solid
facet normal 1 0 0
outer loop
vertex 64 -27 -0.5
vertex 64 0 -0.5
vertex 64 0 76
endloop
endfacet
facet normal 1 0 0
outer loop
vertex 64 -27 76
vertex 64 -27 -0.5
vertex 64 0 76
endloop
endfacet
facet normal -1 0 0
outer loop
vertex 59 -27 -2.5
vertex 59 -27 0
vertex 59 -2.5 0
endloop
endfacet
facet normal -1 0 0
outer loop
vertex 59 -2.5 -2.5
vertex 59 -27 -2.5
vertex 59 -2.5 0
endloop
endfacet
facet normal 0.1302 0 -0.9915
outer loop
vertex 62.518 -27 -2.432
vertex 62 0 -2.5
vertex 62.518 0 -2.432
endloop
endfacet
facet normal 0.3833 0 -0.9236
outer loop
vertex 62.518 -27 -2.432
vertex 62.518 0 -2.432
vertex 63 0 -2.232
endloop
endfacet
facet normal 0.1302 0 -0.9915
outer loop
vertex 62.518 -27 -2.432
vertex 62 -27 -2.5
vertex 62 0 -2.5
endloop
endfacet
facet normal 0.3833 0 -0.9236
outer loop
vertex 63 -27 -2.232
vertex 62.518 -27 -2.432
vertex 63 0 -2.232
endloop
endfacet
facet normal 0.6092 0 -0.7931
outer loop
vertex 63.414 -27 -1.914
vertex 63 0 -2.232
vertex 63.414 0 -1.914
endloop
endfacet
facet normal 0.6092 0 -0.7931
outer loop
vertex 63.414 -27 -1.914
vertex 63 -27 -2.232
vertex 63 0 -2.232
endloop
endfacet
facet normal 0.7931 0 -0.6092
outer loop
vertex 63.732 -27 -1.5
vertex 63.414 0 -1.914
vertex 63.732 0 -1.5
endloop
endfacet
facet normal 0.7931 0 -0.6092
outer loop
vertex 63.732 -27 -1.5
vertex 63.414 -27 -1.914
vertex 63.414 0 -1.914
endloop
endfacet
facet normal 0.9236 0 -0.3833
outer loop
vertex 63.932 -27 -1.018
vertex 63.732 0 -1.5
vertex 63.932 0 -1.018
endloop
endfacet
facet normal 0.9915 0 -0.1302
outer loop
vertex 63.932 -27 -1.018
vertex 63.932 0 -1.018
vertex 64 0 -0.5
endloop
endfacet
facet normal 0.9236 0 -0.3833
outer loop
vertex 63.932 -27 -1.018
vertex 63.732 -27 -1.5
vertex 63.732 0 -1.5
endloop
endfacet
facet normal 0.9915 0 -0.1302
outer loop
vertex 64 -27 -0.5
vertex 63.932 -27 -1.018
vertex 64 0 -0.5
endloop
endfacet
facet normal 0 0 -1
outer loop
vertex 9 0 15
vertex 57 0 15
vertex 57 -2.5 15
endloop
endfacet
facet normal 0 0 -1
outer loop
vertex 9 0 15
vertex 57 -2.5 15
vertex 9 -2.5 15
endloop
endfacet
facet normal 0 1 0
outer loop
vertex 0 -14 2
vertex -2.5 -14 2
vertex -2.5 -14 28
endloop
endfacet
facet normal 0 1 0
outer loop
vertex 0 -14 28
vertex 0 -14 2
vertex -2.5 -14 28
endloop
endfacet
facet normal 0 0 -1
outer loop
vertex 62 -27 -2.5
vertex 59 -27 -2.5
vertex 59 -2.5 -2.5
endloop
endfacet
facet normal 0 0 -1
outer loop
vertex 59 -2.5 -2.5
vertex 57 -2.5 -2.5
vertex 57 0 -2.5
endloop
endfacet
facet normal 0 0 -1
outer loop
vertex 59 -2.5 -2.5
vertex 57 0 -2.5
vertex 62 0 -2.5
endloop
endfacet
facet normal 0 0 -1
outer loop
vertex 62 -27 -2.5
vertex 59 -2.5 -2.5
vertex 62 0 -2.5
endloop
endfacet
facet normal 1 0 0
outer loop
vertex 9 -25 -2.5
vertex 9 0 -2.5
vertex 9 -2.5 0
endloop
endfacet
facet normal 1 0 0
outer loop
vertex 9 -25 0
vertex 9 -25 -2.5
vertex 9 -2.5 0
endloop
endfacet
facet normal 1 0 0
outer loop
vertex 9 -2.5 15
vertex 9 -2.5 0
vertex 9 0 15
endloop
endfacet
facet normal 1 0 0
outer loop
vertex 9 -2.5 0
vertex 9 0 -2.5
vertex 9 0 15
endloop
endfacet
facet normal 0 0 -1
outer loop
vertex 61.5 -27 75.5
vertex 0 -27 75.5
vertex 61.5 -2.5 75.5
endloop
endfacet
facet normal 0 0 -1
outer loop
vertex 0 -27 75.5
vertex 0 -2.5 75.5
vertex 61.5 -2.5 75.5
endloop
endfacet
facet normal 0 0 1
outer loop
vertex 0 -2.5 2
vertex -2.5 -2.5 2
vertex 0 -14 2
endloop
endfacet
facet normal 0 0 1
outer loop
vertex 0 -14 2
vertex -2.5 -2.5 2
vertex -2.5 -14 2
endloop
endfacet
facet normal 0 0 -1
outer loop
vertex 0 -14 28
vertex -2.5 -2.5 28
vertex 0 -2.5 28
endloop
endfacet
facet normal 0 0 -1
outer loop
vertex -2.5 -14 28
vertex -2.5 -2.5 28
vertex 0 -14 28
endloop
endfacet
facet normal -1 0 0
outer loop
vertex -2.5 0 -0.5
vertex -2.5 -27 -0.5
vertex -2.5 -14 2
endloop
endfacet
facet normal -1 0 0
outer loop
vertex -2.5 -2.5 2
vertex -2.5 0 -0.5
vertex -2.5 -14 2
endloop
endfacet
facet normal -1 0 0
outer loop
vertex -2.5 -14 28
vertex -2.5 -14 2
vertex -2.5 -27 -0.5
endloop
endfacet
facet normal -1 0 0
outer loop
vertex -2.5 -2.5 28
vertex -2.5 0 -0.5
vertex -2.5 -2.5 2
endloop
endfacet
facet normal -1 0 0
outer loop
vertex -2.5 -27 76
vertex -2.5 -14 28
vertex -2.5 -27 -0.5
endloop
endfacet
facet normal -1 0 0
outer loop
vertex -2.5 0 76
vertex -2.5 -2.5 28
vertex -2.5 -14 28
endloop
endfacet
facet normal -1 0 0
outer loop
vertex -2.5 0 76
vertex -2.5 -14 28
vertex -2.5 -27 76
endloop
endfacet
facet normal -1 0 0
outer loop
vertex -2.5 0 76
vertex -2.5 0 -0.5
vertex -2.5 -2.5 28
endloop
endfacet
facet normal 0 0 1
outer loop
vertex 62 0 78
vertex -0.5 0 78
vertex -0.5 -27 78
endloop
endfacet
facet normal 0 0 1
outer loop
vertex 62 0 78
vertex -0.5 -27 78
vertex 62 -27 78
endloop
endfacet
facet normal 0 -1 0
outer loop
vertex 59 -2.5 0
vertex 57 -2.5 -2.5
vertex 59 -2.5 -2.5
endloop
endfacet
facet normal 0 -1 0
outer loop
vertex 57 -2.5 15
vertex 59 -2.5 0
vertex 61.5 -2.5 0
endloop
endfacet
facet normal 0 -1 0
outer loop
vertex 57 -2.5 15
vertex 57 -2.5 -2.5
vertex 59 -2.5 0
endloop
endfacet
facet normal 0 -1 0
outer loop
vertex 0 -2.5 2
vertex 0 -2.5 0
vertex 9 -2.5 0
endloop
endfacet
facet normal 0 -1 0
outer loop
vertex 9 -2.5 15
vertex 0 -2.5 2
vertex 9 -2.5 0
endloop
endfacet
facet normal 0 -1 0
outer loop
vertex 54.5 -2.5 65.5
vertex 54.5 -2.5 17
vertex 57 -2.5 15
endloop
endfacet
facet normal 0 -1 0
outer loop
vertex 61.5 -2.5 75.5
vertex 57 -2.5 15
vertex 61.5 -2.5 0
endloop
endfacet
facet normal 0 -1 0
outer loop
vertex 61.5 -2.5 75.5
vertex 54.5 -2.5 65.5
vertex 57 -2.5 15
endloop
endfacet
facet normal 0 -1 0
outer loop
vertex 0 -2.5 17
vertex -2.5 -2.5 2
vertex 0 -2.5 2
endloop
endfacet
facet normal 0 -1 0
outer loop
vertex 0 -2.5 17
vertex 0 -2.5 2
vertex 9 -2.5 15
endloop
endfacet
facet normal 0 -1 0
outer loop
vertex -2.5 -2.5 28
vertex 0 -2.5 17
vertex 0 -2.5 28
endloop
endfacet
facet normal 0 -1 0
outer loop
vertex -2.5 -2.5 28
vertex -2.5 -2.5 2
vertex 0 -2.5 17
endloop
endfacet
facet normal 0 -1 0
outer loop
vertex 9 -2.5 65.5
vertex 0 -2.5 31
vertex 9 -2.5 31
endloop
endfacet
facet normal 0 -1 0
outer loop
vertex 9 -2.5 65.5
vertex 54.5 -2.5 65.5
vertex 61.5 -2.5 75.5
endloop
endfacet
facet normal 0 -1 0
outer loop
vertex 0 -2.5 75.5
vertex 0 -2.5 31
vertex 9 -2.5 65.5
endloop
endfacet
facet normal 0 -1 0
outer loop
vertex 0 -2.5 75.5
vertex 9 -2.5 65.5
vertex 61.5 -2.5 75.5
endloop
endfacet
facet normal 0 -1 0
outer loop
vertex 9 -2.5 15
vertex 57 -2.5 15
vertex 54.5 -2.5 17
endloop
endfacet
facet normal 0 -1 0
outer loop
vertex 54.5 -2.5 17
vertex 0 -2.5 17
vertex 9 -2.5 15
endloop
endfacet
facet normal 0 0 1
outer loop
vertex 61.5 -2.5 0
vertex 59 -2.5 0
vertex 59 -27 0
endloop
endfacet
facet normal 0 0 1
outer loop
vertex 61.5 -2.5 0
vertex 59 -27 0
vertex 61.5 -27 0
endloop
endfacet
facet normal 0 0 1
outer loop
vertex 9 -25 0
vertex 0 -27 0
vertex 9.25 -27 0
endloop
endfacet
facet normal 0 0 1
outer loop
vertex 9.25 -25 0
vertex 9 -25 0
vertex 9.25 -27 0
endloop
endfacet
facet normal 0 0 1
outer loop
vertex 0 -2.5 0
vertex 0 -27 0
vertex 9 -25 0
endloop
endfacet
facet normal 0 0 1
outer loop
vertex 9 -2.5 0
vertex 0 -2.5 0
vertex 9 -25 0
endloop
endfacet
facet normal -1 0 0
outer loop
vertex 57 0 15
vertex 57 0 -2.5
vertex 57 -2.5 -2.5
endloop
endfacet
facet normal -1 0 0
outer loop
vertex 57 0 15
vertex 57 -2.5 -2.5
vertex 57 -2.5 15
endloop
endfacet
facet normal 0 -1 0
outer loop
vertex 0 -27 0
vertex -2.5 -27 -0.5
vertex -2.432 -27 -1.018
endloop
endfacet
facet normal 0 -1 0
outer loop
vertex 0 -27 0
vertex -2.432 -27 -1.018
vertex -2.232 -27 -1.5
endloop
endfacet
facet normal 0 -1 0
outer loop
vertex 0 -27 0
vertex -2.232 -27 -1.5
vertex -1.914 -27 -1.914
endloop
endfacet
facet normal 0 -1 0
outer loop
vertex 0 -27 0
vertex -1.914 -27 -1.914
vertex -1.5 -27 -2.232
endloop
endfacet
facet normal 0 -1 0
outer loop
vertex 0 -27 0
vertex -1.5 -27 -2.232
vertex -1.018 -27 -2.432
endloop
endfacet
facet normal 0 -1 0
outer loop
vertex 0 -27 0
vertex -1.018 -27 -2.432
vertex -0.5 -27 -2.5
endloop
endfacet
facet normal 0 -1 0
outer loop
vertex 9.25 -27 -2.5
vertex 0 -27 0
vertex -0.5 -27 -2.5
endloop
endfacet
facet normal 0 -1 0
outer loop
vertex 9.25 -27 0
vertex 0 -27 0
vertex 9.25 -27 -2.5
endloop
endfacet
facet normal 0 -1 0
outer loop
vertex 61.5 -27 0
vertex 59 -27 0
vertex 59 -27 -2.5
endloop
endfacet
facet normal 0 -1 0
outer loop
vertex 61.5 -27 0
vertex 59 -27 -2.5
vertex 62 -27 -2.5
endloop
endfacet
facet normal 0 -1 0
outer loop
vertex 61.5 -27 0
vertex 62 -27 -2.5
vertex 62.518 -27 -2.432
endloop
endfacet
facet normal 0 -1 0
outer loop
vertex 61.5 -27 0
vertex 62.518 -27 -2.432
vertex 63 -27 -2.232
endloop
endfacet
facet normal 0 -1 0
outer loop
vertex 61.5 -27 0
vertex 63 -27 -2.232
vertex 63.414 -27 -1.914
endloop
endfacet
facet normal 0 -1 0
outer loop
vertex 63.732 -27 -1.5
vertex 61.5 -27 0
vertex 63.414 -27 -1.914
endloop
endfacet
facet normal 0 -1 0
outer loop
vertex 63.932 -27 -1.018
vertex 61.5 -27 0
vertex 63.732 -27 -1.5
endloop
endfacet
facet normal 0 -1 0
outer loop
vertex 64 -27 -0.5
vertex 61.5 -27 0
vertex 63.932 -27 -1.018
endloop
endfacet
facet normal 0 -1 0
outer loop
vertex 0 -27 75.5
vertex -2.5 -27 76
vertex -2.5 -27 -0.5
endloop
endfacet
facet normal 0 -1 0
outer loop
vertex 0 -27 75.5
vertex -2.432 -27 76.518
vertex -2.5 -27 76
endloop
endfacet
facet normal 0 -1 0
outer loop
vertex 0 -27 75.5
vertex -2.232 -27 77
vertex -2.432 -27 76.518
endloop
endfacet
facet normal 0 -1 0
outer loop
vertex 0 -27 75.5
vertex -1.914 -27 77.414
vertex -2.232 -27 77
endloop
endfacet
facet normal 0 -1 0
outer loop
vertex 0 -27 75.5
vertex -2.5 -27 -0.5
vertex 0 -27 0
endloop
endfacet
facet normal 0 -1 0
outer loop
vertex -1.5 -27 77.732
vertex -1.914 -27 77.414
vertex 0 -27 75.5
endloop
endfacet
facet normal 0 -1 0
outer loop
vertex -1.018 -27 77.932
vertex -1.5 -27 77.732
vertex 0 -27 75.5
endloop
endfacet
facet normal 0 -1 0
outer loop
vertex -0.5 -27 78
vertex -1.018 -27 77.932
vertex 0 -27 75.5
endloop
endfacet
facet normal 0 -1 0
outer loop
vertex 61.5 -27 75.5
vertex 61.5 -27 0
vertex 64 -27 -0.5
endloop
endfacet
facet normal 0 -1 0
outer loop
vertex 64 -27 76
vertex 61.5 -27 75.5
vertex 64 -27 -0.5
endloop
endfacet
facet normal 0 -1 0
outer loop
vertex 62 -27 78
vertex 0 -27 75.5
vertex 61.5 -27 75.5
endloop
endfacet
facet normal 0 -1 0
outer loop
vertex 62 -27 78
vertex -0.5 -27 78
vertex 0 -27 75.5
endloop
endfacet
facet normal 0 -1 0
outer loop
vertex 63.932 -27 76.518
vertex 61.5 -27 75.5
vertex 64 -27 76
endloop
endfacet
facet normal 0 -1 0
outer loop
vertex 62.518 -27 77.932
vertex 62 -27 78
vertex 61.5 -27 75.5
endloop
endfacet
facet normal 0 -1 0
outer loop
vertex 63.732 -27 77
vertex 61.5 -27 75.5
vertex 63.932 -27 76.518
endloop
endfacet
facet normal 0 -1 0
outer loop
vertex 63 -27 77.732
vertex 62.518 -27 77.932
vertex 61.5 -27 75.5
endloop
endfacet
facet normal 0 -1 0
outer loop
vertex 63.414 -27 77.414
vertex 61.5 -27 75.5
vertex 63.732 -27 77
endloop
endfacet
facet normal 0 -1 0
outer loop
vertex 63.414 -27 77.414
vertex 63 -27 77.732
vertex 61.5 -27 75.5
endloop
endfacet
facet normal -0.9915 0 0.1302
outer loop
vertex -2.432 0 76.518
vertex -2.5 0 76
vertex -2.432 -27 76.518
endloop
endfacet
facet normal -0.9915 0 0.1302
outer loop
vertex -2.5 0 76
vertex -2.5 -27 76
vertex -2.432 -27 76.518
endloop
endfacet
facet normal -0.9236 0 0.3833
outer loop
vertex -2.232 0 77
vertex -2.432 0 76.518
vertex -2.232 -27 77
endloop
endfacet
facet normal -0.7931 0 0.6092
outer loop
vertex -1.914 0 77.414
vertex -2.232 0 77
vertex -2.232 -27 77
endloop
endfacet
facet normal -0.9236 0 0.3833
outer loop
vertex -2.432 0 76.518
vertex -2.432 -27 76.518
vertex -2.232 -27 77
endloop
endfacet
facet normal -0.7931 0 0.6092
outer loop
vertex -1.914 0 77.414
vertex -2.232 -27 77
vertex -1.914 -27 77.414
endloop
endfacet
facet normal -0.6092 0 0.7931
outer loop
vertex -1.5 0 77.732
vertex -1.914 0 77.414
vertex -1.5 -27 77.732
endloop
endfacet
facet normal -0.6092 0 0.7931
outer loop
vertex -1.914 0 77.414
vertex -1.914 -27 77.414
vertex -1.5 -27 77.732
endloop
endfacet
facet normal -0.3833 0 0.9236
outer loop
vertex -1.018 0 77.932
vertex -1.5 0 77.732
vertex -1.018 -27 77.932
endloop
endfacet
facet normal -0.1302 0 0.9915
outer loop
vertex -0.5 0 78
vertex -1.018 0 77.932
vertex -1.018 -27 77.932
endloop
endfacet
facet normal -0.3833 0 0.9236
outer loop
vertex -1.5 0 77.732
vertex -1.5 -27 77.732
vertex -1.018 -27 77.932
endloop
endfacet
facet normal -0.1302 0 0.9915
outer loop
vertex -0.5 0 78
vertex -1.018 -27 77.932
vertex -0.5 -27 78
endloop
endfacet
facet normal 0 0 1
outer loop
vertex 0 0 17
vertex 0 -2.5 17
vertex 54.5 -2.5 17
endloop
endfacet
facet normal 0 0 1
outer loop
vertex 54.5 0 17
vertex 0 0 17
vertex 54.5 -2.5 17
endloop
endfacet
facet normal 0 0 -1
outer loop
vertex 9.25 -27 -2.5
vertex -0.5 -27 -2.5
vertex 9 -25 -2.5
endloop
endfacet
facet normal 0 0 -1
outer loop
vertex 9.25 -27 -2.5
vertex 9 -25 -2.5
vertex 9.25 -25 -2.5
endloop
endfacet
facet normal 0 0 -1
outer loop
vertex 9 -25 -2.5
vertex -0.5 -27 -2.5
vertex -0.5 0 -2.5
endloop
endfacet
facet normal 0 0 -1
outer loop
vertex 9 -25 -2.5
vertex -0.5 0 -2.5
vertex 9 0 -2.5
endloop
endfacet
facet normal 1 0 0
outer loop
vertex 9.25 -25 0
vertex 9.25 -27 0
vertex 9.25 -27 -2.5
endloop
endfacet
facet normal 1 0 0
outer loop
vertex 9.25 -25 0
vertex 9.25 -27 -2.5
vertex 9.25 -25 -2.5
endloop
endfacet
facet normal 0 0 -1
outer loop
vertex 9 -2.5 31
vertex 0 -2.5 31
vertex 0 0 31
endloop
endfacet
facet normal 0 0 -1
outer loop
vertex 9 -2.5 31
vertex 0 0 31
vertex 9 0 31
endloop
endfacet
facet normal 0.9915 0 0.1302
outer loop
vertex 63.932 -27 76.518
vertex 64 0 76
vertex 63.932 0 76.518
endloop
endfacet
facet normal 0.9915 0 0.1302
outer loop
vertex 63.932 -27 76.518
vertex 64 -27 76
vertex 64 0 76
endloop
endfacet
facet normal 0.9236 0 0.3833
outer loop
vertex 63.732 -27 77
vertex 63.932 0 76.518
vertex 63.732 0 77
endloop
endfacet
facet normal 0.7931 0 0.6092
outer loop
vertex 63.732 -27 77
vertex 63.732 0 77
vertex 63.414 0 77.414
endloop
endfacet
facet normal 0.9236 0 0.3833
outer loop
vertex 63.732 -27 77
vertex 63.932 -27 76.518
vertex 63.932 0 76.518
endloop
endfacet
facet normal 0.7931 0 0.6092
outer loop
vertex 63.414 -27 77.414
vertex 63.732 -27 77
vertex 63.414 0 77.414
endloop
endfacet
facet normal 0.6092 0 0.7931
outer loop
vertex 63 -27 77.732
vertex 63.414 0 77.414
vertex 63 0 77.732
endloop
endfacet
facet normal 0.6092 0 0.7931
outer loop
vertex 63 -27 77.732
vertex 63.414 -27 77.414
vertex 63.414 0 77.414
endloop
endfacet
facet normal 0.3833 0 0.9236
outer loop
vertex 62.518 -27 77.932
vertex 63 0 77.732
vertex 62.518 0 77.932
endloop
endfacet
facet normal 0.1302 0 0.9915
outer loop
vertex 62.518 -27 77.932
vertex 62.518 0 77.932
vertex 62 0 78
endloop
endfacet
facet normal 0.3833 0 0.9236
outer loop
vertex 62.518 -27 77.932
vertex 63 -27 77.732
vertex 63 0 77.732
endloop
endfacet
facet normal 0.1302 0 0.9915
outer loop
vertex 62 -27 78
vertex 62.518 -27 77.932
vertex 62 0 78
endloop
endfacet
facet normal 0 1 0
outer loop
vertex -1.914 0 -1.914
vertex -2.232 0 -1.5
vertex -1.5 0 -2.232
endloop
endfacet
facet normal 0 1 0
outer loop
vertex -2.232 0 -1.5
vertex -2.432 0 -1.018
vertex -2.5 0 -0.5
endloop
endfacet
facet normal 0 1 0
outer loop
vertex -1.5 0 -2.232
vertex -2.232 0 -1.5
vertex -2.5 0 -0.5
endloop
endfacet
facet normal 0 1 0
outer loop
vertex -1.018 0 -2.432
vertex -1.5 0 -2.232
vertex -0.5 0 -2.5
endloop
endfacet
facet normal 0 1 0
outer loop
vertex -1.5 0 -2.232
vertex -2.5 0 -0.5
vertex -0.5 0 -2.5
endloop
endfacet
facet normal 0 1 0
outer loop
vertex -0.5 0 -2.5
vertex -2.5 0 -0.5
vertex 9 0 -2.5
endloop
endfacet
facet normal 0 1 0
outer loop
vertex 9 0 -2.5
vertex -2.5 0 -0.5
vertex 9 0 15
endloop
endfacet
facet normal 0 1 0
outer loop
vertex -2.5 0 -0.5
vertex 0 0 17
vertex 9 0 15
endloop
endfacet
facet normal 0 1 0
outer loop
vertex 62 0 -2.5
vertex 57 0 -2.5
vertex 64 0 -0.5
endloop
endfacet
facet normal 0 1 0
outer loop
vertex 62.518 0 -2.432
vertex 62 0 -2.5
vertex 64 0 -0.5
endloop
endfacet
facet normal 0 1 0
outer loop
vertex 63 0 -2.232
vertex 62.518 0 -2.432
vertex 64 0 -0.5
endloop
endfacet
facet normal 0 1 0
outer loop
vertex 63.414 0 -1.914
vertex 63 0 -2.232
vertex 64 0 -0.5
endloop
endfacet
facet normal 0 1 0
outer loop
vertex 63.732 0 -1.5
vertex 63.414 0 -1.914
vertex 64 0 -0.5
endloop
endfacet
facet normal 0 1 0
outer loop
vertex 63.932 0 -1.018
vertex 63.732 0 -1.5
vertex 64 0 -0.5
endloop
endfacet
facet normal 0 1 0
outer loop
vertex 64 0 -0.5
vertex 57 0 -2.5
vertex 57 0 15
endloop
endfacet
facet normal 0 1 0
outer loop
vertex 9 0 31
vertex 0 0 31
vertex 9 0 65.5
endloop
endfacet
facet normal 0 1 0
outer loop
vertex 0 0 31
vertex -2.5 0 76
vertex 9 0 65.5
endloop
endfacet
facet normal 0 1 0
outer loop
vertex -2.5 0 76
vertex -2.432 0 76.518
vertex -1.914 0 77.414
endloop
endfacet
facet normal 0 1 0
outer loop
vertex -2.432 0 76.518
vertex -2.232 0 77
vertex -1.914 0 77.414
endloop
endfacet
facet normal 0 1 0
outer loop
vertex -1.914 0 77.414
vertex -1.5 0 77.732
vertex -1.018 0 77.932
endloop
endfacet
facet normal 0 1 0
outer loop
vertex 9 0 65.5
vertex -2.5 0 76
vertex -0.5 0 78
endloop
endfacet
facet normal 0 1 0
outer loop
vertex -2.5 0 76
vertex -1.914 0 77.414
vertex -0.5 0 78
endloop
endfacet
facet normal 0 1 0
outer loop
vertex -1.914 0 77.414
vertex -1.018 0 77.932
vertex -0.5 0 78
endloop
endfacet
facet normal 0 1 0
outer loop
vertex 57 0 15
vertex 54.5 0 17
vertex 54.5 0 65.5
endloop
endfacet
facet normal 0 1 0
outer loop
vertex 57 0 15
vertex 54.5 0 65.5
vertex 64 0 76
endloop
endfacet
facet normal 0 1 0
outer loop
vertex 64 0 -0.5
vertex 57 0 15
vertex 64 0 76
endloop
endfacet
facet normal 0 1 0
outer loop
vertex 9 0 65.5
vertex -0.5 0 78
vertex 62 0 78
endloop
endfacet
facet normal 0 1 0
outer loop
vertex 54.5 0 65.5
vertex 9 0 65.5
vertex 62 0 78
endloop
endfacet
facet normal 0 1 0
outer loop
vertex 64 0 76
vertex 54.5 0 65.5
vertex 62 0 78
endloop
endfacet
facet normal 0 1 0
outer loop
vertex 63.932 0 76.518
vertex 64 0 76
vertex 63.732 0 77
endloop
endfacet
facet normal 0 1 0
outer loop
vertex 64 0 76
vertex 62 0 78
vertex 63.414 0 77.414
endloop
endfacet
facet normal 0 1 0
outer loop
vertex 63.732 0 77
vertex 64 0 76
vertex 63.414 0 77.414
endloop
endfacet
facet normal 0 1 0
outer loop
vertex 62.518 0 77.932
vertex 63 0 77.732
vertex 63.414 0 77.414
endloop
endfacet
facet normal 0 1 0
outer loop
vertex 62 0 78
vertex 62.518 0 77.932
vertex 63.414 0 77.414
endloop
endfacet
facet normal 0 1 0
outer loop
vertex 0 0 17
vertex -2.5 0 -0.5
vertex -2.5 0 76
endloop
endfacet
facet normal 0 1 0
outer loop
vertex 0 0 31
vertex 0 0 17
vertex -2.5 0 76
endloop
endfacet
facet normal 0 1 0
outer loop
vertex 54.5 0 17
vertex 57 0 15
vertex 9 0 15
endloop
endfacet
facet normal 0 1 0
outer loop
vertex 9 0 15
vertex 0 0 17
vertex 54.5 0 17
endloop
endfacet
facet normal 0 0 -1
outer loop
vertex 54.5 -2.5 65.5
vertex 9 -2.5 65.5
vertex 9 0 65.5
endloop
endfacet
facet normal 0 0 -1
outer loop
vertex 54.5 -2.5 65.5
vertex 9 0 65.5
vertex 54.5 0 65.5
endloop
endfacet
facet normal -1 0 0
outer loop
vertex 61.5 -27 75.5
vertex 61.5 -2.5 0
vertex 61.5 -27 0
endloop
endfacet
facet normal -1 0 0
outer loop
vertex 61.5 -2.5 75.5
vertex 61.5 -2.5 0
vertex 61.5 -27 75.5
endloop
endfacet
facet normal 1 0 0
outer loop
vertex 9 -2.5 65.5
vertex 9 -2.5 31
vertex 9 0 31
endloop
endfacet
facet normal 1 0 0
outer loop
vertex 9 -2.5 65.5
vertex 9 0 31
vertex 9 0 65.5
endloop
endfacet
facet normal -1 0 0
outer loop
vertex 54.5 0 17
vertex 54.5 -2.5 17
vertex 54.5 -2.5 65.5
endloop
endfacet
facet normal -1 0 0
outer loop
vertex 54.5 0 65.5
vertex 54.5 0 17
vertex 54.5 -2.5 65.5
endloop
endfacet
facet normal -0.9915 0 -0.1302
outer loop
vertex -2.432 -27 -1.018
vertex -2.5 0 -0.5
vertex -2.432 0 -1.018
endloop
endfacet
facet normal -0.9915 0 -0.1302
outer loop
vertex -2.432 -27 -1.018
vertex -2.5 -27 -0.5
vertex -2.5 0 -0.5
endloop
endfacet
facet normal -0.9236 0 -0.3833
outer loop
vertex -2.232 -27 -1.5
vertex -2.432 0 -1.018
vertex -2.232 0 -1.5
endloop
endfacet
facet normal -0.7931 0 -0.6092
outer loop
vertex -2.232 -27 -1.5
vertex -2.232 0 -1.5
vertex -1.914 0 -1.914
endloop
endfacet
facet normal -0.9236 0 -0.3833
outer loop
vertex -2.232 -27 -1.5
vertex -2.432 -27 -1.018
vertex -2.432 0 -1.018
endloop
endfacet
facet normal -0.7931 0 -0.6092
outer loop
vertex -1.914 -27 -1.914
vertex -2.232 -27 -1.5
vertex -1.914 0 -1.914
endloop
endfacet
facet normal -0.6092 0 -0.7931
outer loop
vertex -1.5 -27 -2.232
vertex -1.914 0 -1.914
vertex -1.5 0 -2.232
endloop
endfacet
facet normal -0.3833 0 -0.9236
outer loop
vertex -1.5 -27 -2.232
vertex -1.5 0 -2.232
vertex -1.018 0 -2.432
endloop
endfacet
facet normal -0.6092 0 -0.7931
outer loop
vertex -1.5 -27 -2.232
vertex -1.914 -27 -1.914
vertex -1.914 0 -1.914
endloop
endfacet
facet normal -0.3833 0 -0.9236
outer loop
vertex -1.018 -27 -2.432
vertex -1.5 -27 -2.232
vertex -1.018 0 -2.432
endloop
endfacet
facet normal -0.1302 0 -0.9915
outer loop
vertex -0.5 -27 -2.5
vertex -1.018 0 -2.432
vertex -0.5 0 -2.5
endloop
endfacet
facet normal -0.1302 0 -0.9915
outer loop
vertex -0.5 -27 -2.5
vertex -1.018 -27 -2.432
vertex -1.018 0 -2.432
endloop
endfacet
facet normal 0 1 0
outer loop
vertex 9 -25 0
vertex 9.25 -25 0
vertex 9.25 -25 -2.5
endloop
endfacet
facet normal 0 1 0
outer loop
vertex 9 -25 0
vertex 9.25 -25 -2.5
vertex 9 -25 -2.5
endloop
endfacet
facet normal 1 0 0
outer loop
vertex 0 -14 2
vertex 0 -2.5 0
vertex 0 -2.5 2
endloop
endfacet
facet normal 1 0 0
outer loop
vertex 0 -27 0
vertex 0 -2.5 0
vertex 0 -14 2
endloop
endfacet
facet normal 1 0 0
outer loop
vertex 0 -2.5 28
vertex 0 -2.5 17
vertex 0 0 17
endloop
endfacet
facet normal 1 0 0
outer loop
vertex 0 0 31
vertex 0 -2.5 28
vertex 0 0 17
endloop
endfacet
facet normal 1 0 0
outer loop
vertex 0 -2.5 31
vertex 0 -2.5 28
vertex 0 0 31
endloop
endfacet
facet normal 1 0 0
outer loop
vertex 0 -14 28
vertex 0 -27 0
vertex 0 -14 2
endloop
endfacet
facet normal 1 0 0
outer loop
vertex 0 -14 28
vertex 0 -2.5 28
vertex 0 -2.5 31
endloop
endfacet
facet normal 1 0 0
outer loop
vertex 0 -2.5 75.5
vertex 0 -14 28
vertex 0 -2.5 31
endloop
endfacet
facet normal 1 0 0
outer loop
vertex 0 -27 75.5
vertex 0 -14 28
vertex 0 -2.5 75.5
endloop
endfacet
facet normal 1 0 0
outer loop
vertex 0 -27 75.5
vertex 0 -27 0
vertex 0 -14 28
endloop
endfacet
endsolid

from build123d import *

# Parameters (mm, degrees)
F0_W      = 66.5
F0_H      = 80.5
F1_DEPTH  = 27
F2_T      = -2.5
F3_R      = 2
F4_W      = 49.75
F4_H      = 24.5
F5_DEPTH  = 25
F6_W      = 45.5
F6_H      = 48.5
F7_DEPTH  = 25
F8_W      = 48
F8_H      = 17.5
F9_DEPTH  = 25
F10_W     = 11.5
F10_H     = 26
F11_DEPTH = 25
F12_W     = 9
F12_H     = 14
F13_DEPTH = 25


with BuildPart() as f1:
    # F0 (on Front) → F1 (new body)
    with BuildSketch(Plane.XZ):
        with Locations((30.75, 37.75)):
            Rectangle(F0_W, F0_H)
    extrude(amount=F1_DEPTH)

    # F2
    f2_openings = [f1.faces().sort_by_distance(p)[0] for p in [
        (30.75, -27, 37.75),
    ]]
    offset(amount=F2_T, openings=f2_openings)

    # F3
    f3_edges = [f1.edges().sort_by_distance(p)[0] for p in [
        (64, -13.5, 78),
        (-2.5, -13.5, 78),
        (64, -13.5, -2.5),
        (-2.5, -13.5, -2.5),
    ]]
    fillet(f3_edges, radius=F3_R)

    # F4 (on face) → F5 (cut)
    with BuildSketch(Plane.XY):
        with Locations((34.125, -14.75)):
            Rectangle(F4_W, F4_H)
    extrude(amount=-F5_DEPTH, mode=Mode.SUBTRACT)

    # F6 (on face) → F7 (cut)
    with BuildSketch(Plane.XZ.offset(2.5)):
        with Locations((31.75, 41.25)):
            Rectangle(F6_W, F6_H)
    extrude(amount=-F7_DEPTH, mode=Mode.SUBTRACT)

    # F8 (on face) → F9 (cut)
    with BuildSketch(Plane(origin=(0, 0, 0), x_dir=(-1, 0, 0), z_dir=(0, 1, 0))):
        with Locations((-33, 6.25)):
            Rectangle(F8_W, F8_H)
    extrude(amount=-F9_DEPTH, mode=Mode.SUBTRACT)

    # F10 (on face) → F11 (cut)
    with BuildSketch(Plane(origin=(-2.5, 0, 0), x_dir=(0, -1, 0), z_dir=(-1, 0, 0))):
        with Locations((8.25, 15)):
            Rectangle(F10_W, F10_H)
    extrude(amount=-F11_DEPTH, mode=Mode.SUBTRACT)

    # F12 (on face) → F13 (cut)
    with BuildSketch(Plane.XZ.offset(2.5)):
        with Locations((4.5, 24)):
            Rectangle(F12_W, F12_H)
    extrude(amount=-F13_DEPTH, mode=Mode.SUBTRACT)


solid = f1.part
